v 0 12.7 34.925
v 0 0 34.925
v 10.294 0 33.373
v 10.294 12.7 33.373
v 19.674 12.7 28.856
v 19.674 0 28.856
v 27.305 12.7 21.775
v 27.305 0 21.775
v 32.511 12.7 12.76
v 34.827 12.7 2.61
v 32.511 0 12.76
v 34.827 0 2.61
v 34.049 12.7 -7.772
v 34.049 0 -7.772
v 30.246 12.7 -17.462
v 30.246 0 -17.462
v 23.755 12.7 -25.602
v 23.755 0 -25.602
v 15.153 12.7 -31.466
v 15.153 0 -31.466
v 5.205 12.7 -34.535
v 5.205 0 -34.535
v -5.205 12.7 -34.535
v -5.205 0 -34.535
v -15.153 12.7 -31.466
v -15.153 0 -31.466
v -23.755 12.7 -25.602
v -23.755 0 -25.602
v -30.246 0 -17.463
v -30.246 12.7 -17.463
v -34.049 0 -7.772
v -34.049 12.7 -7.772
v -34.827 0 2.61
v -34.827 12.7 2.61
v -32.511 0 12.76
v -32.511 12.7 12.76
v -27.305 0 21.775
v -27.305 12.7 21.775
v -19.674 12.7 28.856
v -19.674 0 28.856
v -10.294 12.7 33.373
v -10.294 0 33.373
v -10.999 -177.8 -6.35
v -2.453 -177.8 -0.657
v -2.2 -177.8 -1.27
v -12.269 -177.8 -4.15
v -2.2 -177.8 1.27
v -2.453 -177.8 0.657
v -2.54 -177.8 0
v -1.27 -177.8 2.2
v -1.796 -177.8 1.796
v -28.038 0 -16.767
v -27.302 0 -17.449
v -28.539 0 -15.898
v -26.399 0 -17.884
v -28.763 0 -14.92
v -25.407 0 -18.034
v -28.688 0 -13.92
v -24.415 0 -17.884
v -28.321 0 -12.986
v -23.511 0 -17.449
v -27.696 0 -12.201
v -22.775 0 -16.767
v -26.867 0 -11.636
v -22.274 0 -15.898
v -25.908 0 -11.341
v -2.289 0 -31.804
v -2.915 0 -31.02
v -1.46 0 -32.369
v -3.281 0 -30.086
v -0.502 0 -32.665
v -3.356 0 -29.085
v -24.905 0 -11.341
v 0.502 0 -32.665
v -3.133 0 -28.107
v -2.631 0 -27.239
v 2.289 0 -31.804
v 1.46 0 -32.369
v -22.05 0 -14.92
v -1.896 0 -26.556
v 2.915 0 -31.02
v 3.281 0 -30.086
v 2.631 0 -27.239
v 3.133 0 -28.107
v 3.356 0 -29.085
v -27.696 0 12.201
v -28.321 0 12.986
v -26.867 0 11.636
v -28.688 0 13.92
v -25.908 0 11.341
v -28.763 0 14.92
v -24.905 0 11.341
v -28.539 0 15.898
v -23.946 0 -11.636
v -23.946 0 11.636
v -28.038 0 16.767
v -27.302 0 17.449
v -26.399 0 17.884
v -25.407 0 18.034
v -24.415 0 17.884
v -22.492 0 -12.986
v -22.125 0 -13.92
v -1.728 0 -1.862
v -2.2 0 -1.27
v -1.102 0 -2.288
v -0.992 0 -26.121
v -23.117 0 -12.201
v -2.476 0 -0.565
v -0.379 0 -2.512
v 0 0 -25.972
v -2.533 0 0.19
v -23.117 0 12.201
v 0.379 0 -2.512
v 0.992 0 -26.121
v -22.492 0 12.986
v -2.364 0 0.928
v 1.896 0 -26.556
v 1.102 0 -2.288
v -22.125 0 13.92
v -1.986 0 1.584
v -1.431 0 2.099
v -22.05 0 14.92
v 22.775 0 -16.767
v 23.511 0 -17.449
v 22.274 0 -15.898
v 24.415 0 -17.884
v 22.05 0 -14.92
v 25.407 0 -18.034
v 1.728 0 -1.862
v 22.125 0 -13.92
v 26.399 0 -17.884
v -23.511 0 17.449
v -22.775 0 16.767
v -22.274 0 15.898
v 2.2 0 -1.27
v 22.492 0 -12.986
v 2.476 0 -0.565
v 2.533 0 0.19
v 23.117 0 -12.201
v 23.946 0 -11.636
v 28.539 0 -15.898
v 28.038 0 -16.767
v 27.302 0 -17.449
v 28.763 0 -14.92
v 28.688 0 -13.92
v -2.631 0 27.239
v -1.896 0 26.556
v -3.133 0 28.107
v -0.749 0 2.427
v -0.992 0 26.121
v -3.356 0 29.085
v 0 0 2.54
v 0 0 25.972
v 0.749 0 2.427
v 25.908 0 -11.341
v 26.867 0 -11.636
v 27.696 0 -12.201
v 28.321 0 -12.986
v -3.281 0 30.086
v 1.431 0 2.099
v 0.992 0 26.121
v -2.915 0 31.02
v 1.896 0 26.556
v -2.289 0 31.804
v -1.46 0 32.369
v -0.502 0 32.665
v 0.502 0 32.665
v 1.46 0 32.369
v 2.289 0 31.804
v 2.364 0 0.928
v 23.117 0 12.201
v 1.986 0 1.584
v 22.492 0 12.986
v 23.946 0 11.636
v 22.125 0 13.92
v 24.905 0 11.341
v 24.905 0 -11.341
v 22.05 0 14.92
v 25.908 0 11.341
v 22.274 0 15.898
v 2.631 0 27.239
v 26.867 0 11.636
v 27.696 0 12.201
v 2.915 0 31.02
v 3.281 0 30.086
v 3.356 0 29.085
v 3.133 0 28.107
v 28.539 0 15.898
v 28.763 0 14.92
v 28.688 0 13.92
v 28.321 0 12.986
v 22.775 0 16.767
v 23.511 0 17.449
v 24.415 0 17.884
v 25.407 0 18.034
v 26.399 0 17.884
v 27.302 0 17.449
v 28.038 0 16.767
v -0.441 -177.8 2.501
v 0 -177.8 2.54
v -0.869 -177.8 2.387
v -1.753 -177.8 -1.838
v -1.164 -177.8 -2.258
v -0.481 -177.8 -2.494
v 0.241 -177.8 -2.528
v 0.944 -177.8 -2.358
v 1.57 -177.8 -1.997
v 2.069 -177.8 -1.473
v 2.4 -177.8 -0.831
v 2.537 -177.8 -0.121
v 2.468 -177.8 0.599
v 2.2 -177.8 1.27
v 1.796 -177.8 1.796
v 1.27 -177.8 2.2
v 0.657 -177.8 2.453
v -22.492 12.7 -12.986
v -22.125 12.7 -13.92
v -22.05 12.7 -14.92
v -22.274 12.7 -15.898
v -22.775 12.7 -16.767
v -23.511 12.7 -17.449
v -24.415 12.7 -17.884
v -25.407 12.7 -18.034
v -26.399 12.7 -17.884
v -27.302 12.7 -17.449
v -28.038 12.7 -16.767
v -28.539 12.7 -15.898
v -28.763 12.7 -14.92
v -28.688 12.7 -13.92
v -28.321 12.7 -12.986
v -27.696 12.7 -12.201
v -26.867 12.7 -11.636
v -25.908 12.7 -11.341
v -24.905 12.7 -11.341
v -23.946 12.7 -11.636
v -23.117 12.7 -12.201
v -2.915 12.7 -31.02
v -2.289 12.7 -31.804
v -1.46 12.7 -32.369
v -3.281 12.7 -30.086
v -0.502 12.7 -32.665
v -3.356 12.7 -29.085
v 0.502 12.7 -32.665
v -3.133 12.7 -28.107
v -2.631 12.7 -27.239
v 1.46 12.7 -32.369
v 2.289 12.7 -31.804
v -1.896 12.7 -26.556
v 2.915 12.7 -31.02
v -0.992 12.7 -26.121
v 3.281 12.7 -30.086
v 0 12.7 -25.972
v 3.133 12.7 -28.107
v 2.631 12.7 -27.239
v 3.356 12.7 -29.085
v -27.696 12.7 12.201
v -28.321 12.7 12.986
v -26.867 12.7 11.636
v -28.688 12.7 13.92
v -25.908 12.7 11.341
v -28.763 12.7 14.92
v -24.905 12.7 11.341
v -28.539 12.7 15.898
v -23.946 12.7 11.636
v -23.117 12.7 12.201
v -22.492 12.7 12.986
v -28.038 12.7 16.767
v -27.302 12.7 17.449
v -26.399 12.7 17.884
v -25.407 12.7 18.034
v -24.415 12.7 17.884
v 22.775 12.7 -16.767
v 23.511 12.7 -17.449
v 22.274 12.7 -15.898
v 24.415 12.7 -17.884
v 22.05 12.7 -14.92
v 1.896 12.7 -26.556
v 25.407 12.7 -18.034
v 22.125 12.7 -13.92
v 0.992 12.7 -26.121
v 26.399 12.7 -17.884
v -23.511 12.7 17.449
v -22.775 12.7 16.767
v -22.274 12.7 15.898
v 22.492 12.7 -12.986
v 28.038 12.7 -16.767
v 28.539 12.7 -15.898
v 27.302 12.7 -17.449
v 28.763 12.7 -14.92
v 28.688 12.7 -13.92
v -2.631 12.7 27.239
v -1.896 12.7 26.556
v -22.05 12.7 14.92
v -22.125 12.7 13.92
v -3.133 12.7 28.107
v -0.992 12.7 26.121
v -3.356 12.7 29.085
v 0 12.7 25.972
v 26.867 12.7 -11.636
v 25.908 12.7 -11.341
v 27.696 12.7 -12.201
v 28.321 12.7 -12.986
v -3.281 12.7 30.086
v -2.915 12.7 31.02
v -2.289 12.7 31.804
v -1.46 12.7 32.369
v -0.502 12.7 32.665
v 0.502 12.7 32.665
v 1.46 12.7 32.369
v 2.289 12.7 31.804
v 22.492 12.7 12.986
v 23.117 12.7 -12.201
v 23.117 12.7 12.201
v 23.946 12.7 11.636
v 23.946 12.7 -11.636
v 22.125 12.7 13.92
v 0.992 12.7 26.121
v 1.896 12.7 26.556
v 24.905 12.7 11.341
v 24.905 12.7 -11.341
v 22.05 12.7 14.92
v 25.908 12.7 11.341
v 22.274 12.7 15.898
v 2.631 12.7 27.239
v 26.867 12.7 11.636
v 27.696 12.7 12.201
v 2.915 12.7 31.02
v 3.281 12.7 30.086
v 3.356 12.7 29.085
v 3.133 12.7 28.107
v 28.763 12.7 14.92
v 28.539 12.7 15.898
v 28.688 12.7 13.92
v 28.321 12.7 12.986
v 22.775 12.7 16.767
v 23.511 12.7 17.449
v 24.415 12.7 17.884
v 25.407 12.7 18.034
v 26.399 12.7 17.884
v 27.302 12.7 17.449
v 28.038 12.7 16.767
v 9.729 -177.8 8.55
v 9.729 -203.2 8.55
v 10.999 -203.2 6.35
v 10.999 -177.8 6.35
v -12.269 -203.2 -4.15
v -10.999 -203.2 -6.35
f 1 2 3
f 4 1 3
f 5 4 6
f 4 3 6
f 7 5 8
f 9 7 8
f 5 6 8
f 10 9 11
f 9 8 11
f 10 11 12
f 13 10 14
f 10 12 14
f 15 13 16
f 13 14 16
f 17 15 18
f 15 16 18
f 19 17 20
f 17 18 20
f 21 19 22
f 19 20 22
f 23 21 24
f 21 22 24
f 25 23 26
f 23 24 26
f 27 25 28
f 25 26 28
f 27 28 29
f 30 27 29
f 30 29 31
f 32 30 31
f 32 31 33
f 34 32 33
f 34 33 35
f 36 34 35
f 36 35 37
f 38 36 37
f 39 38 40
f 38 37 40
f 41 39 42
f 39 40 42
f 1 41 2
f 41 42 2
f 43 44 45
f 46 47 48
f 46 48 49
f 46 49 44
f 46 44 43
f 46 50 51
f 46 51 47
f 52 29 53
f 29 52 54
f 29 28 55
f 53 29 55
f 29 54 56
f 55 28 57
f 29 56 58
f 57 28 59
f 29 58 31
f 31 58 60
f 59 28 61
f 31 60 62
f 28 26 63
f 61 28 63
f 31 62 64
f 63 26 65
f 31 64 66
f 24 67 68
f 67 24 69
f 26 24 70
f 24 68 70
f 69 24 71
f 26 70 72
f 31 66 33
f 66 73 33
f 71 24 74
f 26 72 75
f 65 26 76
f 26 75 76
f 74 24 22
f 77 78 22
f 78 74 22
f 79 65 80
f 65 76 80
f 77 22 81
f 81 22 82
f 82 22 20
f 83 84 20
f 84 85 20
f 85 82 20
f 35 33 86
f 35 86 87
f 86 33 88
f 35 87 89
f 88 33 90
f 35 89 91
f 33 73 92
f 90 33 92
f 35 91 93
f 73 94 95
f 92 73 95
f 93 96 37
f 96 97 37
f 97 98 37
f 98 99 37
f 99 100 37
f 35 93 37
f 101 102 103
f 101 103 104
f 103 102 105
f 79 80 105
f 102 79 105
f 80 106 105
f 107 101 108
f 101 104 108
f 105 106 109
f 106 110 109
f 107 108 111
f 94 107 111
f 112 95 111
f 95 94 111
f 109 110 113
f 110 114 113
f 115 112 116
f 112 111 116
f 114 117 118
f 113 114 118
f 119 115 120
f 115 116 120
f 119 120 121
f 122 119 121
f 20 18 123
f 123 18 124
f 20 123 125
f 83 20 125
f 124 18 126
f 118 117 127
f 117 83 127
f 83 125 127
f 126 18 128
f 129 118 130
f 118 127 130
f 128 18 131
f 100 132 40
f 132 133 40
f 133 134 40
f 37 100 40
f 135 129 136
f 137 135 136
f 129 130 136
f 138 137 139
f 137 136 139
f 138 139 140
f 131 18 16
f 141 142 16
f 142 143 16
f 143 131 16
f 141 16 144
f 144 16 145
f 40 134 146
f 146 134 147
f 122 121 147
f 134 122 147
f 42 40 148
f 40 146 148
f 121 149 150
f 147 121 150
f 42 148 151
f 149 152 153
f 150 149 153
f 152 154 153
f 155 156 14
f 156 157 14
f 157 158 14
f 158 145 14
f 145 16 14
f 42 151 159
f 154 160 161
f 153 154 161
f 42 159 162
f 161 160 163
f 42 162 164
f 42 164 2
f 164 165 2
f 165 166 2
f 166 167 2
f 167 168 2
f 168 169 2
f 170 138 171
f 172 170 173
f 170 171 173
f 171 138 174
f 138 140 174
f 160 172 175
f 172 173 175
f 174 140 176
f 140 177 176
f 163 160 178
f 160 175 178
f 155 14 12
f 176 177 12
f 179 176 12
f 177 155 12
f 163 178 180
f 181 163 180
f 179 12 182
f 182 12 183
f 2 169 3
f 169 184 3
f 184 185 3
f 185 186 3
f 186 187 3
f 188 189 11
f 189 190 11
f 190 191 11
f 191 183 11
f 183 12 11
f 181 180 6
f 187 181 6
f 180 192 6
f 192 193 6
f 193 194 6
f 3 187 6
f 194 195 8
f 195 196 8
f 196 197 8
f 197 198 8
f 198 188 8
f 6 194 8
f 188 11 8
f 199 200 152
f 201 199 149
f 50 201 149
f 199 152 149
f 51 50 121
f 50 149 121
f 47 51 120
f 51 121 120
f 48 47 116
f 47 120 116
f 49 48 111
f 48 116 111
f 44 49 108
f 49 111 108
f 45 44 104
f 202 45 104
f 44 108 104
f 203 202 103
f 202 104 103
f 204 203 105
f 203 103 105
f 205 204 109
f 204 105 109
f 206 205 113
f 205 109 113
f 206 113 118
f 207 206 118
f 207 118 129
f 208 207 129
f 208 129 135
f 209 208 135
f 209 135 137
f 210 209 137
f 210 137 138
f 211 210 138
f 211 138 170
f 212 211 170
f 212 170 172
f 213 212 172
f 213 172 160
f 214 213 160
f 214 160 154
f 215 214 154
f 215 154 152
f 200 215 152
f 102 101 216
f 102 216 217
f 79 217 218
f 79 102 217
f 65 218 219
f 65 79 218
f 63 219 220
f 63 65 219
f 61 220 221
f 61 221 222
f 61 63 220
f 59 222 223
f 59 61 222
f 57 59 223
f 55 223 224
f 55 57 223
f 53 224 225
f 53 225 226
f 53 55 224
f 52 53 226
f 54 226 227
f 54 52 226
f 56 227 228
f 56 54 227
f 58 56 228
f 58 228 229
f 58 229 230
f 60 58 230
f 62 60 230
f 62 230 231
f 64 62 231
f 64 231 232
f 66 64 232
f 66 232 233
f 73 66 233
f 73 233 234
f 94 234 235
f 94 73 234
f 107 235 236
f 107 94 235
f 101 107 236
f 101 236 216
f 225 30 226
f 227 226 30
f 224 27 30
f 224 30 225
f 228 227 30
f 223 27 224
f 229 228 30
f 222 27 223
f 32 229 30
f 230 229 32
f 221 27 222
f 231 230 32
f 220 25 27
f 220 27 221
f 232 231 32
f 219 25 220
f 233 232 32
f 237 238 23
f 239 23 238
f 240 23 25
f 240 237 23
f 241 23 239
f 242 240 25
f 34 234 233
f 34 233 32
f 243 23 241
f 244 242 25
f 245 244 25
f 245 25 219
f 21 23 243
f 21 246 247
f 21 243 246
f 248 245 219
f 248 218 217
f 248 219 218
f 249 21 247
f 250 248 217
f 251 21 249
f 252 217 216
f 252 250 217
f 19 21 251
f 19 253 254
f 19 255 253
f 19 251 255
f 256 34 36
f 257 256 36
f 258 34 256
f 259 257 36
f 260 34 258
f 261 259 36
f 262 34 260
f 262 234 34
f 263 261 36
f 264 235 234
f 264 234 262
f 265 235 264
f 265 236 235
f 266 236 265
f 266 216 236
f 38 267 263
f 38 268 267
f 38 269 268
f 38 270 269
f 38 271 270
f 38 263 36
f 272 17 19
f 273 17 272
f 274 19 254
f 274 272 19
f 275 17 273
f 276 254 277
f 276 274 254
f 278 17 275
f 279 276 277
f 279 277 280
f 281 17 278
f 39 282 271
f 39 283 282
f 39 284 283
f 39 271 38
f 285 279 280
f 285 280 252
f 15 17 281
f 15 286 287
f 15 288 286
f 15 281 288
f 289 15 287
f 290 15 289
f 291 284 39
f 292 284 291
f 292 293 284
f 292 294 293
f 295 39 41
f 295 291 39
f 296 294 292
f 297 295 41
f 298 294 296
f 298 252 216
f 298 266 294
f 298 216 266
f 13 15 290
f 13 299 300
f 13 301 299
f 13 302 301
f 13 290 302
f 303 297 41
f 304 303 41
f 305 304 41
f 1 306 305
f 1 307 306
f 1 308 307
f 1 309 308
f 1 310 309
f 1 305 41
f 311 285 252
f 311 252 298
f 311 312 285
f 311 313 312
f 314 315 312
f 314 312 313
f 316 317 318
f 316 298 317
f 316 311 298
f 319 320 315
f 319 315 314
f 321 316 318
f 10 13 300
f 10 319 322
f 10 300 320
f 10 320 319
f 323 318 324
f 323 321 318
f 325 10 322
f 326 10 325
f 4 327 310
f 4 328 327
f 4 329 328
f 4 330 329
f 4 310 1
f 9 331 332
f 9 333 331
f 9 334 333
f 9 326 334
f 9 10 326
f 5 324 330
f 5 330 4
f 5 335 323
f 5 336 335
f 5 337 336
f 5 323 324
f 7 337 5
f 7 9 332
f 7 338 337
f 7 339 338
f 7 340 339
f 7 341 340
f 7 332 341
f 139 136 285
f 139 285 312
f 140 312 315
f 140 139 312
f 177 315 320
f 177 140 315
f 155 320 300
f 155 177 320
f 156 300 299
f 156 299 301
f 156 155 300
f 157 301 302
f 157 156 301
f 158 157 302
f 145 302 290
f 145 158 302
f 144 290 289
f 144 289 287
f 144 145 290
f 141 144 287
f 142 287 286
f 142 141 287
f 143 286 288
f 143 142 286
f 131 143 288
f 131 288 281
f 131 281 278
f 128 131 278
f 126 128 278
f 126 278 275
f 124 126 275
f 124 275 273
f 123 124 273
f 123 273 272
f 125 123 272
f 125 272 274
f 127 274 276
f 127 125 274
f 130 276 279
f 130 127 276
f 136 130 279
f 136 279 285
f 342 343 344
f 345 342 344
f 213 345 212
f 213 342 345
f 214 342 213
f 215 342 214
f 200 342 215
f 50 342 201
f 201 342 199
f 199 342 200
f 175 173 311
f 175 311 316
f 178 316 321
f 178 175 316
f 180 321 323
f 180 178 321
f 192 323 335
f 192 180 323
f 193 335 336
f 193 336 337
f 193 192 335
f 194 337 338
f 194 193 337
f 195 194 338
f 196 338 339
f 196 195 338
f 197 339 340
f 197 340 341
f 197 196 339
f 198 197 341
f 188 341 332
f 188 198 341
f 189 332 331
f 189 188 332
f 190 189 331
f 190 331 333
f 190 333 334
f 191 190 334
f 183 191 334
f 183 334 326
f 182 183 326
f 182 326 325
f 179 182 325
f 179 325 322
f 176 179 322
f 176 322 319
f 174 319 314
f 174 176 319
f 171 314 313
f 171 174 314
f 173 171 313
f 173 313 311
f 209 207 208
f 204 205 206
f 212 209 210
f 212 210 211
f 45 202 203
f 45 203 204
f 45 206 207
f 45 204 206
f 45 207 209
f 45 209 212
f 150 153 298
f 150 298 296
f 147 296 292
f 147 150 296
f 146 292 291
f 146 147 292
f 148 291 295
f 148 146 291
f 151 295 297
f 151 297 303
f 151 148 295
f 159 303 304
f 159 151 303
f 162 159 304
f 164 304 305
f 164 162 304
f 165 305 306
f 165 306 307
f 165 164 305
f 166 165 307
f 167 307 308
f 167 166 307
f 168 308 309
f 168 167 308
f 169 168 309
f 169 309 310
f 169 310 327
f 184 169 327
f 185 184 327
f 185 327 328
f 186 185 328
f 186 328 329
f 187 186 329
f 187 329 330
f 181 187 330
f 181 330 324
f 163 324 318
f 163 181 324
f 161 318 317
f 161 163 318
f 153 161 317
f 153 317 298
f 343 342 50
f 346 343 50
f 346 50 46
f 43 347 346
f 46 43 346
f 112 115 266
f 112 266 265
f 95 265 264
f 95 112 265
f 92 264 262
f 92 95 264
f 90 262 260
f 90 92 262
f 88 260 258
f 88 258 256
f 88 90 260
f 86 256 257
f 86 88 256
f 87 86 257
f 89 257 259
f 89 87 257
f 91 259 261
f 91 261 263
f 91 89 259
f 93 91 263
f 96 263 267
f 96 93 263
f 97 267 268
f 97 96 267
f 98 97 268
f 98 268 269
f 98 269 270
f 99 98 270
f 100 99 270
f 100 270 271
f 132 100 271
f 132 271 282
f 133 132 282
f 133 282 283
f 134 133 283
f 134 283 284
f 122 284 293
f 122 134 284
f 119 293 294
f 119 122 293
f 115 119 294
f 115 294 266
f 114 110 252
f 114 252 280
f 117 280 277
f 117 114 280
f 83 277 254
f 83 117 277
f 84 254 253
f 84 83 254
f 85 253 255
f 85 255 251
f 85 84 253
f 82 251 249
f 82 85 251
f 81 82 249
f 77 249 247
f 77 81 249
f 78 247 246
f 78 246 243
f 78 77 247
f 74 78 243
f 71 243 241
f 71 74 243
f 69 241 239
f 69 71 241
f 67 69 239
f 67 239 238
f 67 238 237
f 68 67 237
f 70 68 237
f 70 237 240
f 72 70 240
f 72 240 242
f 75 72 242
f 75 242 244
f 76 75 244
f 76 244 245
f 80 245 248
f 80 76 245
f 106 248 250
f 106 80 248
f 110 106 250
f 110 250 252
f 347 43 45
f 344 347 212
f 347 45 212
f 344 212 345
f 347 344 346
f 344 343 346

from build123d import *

# Parameters (mm, degrees)
SKETCH1_R           = 34.925
EXTRUDE1_DEPTH      = 12.7
SKETCH3_R           = 3.3655
CUT_EXTRUDE2_DEPTH  = 12.7
CIRPATTERN1_COUNT   = 6
SKETCH8_R           = 2.54
EXTRUDE3_DEPTH      = 177.8
EXTRUDE_THIN1_DEPTH = 25.4


with BuildPart() as part:
    # Sketch1 → Extrude1 (new body)
    with BuildSketch(Plane(origin=(0, 0, 0), x_dir=(1, 0, 0), z_dir=(0, 1, 0))):
        with Locations(Location((0, 0, 0), (0, 0, 270))):
            Circle(SKETCH1_R)
    extrude(amount=EXTRUDE1_DEPTH)

    # Sketch3 → Cut-Extrude2 (cut)
    with BuildSketch(Plane(origin=(0, 0, 0), x_dir=(1, 0, 0), z_dir=(0, 1, 0))):
        with Locations(Location((0, 29.337, 0), (0, 0, 270))):
            Circle(SKETCH3_R)
    cut_extrude2 = extrude(amount=CUT_EXTRUDE2_DEPTH, mode=Mode.SUBTRACT)

    # CirPattern1: Cut-Extrude2 ×6 about axis
    cirpattern1_axis = Axis((0, 0, 0), (0, 1, 0))
    for i in range(1, CIRPATTERN1_COUNT):
        add(cut_extrude2.rotate(cirpattern1_axis, i * 360 / CIRPATTERN1_COUNT), mode=Mode.SUBTRACT)

    # Sketch8 → Extrude3 (add)
    with BuildSketch(Plane.XZ):
        with Locations(Location((0, 0, 0), (0, 0, 90))):
            Circle(SKETCH8_R)
    extrude(amount=EXTRUDE3_DEPTH)

    # Sketch12 → Extrude-Thin1 (add)
    with BuildSketch(Plane.XZ.offset(177.8)):
        Polygon((10.998522628, 6.35), (0, 0), (-10.998522628, -6.35), (-12.268522628, -4.150295474), (-1.27, 2.199704526), (9.728522628, 8.549704526), align=None)
    extrude(amount=EXTRUDE_THIN1_DEPTH)


solid = part.part
